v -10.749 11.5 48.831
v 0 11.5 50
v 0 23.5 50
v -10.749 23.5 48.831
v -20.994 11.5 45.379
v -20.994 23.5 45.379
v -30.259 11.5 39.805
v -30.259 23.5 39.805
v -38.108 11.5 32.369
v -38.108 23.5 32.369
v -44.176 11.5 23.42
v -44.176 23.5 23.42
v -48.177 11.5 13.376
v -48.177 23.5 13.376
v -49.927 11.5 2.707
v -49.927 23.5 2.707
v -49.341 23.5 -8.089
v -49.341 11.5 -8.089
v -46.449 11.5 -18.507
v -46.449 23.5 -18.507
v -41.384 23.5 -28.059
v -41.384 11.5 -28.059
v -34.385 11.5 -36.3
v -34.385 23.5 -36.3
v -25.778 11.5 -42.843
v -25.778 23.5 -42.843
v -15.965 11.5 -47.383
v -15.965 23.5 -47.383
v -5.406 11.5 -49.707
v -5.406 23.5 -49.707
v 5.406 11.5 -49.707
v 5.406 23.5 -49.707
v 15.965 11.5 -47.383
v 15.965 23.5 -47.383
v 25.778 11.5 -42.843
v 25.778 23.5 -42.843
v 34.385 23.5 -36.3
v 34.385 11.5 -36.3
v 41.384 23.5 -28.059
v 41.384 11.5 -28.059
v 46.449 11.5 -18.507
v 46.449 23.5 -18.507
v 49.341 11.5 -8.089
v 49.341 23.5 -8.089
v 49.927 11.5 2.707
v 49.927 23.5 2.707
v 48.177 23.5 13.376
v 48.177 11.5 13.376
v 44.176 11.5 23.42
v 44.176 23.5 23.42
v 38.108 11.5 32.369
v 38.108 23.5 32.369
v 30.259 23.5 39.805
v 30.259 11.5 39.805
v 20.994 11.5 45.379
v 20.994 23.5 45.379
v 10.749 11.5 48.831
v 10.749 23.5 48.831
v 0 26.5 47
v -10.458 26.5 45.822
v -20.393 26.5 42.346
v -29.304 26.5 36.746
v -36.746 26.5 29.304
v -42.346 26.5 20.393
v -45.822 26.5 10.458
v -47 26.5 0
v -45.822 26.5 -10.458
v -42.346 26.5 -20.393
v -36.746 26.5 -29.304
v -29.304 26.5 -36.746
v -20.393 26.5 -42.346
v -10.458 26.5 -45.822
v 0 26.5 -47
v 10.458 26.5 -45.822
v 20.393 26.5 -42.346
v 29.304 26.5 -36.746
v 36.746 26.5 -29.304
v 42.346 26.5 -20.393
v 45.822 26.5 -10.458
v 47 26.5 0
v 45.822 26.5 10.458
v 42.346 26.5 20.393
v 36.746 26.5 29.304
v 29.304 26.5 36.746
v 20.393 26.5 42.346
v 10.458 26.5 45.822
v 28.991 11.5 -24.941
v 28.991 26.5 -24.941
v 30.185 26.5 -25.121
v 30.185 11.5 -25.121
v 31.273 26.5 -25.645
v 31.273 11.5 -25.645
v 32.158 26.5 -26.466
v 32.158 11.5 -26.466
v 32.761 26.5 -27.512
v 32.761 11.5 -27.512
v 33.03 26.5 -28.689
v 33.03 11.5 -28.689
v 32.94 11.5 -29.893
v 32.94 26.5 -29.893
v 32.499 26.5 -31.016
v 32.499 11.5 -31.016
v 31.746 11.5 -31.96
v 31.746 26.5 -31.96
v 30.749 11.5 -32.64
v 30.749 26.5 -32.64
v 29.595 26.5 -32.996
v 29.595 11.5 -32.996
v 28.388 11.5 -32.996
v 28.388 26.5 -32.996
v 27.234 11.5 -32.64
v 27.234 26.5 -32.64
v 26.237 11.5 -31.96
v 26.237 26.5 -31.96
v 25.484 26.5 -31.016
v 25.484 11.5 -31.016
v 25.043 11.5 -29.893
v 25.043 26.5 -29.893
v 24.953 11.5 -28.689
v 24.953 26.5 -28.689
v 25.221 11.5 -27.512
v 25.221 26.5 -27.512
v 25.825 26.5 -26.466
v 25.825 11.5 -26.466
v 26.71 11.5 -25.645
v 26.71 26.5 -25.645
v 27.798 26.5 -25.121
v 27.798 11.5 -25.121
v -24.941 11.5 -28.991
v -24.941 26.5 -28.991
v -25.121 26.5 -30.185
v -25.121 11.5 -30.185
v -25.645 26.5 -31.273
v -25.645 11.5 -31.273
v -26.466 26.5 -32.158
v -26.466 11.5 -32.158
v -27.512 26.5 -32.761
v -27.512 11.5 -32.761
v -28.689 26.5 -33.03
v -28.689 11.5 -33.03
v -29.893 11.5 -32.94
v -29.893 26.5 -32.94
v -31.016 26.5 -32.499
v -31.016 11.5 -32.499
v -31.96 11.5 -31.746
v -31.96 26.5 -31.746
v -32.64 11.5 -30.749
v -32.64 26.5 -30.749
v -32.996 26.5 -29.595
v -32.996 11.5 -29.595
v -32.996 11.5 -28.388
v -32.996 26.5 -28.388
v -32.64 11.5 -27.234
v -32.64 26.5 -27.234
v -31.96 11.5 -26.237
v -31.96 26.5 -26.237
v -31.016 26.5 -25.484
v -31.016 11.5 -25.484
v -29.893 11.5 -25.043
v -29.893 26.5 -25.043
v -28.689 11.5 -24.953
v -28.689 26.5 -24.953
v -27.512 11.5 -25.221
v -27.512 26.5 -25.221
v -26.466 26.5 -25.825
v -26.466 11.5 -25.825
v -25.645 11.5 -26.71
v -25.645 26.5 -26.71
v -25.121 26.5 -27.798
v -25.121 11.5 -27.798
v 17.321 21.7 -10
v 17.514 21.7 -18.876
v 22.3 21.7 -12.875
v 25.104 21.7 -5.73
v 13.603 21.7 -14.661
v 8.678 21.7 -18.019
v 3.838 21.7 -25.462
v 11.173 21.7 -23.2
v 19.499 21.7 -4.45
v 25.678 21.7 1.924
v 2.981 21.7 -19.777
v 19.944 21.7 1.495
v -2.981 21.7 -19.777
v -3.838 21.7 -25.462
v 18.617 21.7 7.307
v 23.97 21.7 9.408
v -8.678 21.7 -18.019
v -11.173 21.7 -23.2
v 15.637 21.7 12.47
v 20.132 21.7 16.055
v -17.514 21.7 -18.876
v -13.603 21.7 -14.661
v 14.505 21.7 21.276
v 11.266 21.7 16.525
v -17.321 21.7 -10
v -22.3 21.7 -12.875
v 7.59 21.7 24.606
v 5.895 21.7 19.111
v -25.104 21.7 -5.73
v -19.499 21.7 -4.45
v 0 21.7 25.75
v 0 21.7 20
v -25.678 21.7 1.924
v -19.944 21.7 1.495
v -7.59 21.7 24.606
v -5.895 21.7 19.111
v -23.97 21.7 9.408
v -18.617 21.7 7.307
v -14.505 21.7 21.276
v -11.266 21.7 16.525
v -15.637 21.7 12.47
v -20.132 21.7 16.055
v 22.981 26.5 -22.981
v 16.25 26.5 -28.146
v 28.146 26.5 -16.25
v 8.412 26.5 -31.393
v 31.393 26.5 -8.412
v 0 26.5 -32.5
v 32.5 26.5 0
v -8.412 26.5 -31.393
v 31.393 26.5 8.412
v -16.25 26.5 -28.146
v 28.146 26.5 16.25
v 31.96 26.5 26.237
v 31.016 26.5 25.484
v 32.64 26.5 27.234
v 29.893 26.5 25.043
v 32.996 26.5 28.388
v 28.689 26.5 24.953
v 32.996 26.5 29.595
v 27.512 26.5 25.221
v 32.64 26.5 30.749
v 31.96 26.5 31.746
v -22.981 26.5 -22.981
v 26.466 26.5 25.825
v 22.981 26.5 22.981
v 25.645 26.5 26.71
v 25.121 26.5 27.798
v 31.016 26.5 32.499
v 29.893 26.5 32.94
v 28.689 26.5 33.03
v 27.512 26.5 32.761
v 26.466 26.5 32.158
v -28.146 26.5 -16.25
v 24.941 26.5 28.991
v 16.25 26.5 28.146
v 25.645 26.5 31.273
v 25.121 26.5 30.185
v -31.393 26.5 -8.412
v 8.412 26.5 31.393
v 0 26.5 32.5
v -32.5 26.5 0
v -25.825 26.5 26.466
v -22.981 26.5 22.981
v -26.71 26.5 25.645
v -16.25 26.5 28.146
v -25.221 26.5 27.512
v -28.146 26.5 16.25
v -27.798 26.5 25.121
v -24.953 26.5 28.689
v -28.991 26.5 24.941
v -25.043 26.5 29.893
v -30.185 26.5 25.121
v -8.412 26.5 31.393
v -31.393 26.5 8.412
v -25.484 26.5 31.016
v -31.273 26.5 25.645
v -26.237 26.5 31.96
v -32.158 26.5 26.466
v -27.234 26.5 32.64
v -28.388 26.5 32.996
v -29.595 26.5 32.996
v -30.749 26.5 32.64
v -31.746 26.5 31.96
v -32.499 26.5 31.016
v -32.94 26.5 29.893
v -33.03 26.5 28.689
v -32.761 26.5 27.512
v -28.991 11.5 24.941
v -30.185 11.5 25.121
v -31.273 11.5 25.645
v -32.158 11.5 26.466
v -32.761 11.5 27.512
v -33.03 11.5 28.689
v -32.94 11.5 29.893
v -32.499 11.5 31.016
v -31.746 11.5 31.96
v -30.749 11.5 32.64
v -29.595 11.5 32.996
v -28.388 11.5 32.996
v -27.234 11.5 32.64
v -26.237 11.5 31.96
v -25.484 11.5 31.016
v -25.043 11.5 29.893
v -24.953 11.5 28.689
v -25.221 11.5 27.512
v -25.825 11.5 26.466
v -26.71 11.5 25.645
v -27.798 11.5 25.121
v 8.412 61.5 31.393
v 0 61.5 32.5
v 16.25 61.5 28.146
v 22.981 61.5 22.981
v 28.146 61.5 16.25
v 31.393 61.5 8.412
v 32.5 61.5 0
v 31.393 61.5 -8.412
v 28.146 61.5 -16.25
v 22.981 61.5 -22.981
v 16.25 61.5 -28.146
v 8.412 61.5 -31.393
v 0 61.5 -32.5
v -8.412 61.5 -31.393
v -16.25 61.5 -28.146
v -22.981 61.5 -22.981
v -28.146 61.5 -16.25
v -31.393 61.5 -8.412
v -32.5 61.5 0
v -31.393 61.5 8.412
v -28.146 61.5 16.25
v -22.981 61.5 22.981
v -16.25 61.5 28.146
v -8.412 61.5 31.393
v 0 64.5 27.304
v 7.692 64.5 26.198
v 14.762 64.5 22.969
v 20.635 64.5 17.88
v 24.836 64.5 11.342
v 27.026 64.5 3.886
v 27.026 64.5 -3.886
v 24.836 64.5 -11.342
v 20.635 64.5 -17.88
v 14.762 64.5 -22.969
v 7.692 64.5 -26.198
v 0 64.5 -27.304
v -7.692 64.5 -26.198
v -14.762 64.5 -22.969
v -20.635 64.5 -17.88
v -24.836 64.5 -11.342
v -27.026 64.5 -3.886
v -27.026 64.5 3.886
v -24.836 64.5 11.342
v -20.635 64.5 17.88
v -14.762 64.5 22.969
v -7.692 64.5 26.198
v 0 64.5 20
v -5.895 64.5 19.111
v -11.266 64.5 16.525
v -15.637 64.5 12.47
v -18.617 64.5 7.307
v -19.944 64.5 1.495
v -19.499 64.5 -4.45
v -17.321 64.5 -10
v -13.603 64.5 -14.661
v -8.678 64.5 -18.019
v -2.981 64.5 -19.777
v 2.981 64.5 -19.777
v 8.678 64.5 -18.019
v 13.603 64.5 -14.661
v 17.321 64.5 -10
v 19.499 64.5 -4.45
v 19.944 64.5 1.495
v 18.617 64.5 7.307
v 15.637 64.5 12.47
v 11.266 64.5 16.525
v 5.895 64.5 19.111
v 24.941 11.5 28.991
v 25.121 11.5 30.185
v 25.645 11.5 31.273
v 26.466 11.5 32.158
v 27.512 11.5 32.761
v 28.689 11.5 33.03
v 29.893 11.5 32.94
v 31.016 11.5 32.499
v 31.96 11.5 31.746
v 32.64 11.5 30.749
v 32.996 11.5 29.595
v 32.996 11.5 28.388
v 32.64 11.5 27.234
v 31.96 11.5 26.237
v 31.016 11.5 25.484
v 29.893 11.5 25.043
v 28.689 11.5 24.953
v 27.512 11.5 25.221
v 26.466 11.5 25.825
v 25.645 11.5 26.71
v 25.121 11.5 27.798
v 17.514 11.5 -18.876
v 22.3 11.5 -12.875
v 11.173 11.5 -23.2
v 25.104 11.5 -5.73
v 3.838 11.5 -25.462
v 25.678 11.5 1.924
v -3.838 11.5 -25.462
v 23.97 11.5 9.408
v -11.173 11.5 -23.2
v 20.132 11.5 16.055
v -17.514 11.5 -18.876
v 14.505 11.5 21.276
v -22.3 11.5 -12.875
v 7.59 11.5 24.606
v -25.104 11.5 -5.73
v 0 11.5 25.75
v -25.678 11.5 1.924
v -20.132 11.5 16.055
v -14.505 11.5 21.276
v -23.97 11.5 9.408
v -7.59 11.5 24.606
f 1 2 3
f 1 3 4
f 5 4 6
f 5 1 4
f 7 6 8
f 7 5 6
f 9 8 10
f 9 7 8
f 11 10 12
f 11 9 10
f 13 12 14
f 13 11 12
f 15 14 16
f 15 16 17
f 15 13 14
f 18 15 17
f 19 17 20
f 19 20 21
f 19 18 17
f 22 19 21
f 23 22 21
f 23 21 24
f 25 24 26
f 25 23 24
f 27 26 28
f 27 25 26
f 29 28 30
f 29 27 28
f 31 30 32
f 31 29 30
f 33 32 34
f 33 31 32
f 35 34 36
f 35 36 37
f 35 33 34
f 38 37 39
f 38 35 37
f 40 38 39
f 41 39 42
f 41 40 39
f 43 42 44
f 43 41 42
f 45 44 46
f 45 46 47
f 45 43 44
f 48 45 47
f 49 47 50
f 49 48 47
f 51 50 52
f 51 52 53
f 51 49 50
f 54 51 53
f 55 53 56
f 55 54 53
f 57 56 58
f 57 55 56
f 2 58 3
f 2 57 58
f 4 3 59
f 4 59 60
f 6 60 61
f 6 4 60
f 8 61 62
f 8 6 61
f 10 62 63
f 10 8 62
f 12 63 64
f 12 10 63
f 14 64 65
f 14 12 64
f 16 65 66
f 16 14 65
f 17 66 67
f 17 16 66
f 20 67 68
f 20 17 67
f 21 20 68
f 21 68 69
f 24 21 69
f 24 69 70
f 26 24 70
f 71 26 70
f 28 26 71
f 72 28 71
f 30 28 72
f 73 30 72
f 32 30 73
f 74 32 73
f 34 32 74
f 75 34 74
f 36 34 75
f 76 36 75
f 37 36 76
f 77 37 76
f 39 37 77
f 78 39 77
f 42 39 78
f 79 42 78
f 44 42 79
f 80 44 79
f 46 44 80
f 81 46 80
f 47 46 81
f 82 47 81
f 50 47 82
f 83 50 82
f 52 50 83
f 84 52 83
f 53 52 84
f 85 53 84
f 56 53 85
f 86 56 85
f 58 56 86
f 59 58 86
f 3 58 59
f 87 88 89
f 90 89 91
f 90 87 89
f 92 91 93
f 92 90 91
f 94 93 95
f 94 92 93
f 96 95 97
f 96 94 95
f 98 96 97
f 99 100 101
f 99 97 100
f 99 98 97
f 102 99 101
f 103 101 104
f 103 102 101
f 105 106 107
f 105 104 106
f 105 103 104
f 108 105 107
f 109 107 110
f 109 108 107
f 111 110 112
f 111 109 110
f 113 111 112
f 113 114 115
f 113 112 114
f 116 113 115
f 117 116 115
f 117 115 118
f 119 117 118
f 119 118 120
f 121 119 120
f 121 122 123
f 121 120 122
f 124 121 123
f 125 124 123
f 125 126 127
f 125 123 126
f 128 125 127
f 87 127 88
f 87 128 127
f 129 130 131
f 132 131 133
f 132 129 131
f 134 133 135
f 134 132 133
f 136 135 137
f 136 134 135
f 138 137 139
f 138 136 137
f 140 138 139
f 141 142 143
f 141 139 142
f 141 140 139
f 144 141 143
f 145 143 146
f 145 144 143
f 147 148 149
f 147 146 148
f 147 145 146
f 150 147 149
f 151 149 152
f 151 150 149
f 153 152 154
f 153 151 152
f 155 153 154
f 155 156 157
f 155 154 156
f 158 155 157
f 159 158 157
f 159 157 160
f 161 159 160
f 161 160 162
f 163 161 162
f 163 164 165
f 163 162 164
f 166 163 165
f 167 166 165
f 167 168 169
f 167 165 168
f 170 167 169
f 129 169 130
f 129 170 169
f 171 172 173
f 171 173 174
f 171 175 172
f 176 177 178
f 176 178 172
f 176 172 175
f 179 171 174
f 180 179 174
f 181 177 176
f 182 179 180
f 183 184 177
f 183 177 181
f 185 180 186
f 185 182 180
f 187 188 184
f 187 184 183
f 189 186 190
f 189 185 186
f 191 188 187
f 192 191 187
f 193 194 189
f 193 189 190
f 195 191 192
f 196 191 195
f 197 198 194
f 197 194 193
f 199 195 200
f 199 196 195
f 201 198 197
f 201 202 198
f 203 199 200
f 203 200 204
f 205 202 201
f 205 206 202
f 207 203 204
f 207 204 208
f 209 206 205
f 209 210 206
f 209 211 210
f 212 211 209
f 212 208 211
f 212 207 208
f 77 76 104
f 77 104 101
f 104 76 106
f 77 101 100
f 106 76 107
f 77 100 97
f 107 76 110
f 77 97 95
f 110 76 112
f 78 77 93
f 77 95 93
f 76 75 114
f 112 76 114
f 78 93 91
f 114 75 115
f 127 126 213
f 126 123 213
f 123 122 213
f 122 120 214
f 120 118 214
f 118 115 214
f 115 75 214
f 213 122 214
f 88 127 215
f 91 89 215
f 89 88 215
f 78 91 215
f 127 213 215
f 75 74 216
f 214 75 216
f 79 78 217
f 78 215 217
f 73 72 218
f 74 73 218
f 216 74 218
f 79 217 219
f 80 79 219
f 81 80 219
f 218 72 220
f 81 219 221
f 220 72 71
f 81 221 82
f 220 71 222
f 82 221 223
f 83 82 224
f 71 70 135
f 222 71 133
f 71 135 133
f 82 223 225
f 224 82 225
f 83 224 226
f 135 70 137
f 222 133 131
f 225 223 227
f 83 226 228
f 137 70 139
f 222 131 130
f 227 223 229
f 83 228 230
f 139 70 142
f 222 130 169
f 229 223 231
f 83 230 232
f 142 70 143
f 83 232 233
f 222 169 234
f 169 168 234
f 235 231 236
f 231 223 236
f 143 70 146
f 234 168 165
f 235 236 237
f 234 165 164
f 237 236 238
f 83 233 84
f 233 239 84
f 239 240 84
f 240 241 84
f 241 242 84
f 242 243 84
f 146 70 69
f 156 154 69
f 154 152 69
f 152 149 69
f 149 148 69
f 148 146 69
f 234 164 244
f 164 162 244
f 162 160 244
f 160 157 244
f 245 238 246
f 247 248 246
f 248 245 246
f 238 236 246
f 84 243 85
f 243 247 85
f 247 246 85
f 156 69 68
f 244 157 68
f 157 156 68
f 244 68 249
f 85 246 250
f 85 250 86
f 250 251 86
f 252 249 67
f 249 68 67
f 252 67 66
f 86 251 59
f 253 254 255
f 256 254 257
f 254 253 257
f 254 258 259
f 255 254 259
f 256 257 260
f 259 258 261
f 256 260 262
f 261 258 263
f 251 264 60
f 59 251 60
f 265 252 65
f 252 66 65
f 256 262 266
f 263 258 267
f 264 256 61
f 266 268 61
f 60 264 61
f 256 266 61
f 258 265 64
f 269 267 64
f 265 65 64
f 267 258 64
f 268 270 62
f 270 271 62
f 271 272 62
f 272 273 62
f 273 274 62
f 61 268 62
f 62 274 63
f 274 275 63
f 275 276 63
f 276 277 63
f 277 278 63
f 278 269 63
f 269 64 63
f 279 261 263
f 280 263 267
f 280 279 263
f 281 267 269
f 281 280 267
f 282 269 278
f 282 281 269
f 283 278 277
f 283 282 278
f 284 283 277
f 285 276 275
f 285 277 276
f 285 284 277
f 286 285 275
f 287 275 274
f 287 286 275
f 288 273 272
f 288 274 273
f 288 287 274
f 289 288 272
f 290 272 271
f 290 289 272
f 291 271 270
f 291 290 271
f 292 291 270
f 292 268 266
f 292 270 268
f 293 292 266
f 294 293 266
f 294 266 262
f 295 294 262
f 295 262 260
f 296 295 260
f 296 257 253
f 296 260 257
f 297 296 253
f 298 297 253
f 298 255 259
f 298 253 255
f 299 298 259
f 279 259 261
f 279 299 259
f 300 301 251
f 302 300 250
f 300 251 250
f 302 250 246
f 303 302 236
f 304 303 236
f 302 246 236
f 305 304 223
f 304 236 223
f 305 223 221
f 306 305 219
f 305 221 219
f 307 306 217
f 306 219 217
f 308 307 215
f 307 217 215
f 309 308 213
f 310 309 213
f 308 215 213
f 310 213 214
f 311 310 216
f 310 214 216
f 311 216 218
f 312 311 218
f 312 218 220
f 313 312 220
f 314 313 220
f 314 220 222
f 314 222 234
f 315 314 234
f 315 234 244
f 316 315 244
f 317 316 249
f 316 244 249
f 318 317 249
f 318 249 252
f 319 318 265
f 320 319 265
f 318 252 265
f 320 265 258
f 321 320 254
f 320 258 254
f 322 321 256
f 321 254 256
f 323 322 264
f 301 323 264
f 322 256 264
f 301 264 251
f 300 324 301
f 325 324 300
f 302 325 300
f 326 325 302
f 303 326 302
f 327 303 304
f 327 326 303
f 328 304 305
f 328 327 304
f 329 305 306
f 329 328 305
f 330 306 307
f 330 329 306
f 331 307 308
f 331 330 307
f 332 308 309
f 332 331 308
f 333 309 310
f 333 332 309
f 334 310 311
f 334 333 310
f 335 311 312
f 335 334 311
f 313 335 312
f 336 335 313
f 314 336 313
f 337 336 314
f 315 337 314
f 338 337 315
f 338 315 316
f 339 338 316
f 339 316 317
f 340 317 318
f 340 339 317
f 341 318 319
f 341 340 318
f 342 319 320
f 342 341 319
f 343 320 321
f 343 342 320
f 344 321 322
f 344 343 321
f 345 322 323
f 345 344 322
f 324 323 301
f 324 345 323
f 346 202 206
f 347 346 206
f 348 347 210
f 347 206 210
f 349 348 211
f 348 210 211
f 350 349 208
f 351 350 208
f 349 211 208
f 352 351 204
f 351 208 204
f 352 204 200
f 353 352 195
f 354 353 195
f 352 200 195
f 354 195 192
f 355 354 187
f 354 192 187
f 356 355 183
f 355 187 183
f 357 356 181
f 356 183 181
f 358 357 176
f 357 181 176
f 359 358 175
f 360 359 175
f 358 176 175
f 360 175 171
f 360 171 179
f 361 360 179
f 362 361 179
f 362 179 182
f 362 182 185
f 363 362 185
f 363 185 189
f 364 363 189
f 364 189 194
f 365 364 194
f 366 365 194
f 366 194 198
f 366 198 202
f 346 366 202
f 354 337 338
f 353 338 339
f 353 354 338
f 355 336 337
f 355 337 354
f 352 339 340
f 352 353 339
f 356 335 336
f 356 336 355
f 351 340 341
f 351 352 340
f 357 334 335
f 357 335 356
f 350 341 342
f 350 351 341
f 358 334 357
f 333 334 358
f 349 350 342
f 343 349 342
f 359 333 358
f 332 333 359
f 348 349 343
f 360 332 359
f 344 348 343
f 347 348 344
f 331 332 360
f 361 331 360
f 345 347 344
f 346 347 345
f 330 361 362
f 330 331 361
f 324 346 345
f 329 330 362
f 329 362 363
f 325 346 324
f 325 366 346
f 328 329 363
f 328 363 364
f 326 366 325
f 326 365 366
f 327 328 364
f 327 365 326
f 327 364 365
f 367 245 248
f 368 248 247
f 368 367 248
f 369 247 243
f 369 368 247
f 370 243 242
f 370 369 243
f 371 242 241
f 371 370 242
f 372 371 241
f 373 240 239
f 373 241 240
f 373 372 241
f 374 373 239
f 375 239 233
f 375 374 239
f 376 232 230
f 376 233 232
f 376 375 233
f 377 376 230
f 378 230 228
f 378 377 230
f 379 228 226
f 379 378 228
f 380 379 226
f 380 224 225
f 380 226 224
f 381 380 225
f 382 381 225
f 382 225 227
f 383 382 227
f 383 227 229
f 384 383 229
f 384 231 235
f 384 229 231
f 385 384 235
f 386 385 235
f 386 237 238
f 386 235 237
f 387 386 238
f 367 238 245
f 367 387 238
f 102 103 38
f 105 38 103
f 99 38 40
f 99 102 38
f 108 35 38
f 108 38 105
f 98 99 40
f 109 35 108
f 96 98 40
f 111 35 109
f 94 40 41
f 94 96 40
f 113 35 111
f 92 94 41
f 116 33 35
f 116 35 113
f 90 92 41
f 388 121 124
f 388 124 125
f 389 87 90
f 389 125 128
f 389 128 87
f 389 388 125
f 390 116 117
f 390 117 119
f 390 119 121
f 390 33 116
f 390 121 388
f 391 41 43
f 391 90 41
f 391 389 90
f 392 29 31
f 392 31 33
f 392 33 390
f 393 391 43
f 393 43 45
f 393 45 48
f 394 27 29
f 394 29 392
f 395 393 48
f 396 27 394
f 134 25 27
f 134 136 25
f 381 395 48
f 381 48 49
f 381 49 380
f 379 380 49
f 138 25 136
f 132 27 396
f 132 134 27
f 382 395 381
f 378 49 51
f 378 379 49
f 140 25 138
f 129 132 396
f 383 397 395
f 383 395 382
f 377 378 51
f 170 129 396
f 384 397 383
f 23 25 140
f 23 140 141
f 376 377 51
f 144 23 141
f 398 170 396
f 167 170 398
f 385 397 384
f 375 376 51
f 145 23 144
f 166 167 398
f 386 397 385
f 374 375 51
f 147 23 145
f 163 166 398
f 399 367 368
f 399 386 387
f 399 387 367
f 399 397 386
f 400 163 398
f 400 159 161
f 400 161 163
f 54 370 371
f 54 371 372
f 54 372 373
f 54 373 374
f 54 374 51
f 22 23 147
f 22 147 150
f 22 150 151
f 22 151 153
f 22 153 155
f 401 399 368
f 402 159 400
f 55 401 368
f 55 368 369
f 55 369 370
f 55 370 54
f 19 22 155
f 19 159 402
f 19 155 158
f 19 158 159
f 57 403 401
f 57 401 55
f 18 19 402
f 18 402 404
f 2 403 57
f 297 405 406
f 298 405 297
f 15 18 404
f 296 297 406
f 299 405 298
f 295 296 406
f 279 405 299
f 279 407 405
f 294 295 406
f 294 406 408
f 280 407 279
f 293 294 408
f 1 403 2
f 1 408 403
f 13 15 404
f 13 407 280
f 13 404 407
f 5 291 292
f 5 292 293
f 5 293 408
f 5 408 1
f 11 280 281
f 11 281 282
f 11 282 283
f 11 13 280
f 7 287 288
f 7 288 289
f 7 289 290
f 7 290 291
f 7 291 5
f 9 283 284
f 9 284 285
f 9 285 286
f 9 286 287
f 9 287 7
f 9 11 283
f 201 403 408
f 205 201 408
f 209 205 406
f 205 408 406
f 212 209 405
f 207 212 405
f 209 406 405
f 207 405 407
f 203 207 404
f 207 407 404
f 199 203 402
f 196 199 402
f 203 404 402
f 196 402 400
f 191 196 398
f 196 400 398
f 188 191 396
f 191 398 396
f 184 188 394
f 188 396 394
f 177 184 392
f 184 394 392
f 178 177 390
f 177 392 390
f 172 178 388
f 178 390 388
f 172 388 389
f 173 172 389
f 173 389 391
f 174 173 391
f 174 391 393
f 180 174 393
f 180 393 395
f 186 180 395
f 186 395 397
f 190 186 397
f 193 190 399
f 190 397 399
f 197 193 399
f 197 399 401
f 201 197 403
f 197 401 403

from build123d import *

# Parameters (mm, degrees)
SKETCH1_R           = 50
BOSS_EXTRUDE1_DEPTH = 15
SKETCH6_R           = 32.5
BOSS_EXTRUDE2_DEPTH = 35
SKETCH7_R           = 32.5
BOSS_EXTRUDE3_DEPTH = 3
BOSS_EXTRUDE3_TAPER = 60
SKETCH9_R           = 25.75
CUT_EXTRUDE5_DEPTH  = 10.2
SKETCH10_R          = 20
CUT_EXTRUDE6_DEPTH  = 83.654945457
SKETCH11_R          = 4.05
CUT_EXTRUDE7_DEPTH  = 40
CIRPATTERN1_COUNT   = 4
CHAMFER1_SIZE       = 3


with BuildPart() as part:
    # Sketch1 → Boss-Extrude1 (new body)
    with BuildSketch(Plane.XZ.offset(-11.5)):
        with Locations(Location((0, 0, 0), (0, 0, 90))):
            Circle(SKETCH1_R)
    extrude(amount=-BOSS_EXTRUDE1_DEPTH)

    # Sketch6 → Boss-Extrude2 (add)
    with BuildSketch(Plane(origin=(0, 26.5, 0), x_dir=(-1, 0, 0), z_dir=(0, 1, 0))):
        with Locations(Location((0, 0, 0), (0, 0, 90))):
            Circle(SKETCH6_R)
    extrude(amount=BOSS_EXTRUDE2_DEPTH)

    # Sketch7 → Boss-Extrude3 (add)
    with BuildSketch(Plane(origin=(0, 61.5, 0), x_dir=(-1, 0, 0), z_dir=(0, 1, 0))):
        with Locations(Location((0, 0, 0), (0, 0, 90))):
            Circle(SKETCH7_R)
    extrude(amount=BOSS_EXTRUDE3_DEPTH, taper=BOSS_EXTRUDE3_TAPER)

    # Sketch9 → Cut-Extrude5 (cut)
    with BuildSketch(Plane.XZ.offset(-11.5)):
        with Locations(Location((0, 0, 0), (0, 0, 90))):
            Circle(SKETCH9_R)
    extrude(amount=-CUT_EXTRUDE5_DEPTH, mode=Mode.SUBTRACT)

    # Sketch10 → Cut-Extrude6 (cut, through all)
    with BuildSketch(Plane.XZ.offset(-21.7)):
        with Locations(Location((0, 0, 0), (0, 0, 90))):
            Circle(SKETCH10_R)
    extrude(amount=-CUT_EXTRUDE6_DEPTH, mode=Mode.SUBTRACT)

    # Sketch11 → Cut-Extrude7 (cut)
    with BuildSketch(Plane(origin=(389.160069558, 11.5, 0), x_dir=(1, 0, 0), z_dir=(0, 1, 0))):
        with Locations(Location((-360.168691529, 28.991378029, 0), (0, 0, 270))):
            Circle(SKETCH11_R)
    cut_extrude7 = extrude(amount=CUT_EXTRUDE7_DEPTH, mode=Mode.SUBTRACT)

    # CirPattern1: Cut-Extrude7 ×4 about axis
    cirpattern1_axis = Axis((0, 0, 0), (0, 1, 0))
    for i in range(1, CIRPATTERN1_COUNT):
        add(cut_extrude7.rotate(cirpattern1_axis, i * 360 / CIRPATTERN1_COUNT), mode=Mode.SUBTRACT)

    # Chamfer1
    chamfer1_edges = [part.edges().sort_by_distance(p)[0] for p in [
        (0, 26.5, -50),
    ]]
    chamfer(chamfer1_edges, length=CHAMFER1_SIZE)


solid = part.part
